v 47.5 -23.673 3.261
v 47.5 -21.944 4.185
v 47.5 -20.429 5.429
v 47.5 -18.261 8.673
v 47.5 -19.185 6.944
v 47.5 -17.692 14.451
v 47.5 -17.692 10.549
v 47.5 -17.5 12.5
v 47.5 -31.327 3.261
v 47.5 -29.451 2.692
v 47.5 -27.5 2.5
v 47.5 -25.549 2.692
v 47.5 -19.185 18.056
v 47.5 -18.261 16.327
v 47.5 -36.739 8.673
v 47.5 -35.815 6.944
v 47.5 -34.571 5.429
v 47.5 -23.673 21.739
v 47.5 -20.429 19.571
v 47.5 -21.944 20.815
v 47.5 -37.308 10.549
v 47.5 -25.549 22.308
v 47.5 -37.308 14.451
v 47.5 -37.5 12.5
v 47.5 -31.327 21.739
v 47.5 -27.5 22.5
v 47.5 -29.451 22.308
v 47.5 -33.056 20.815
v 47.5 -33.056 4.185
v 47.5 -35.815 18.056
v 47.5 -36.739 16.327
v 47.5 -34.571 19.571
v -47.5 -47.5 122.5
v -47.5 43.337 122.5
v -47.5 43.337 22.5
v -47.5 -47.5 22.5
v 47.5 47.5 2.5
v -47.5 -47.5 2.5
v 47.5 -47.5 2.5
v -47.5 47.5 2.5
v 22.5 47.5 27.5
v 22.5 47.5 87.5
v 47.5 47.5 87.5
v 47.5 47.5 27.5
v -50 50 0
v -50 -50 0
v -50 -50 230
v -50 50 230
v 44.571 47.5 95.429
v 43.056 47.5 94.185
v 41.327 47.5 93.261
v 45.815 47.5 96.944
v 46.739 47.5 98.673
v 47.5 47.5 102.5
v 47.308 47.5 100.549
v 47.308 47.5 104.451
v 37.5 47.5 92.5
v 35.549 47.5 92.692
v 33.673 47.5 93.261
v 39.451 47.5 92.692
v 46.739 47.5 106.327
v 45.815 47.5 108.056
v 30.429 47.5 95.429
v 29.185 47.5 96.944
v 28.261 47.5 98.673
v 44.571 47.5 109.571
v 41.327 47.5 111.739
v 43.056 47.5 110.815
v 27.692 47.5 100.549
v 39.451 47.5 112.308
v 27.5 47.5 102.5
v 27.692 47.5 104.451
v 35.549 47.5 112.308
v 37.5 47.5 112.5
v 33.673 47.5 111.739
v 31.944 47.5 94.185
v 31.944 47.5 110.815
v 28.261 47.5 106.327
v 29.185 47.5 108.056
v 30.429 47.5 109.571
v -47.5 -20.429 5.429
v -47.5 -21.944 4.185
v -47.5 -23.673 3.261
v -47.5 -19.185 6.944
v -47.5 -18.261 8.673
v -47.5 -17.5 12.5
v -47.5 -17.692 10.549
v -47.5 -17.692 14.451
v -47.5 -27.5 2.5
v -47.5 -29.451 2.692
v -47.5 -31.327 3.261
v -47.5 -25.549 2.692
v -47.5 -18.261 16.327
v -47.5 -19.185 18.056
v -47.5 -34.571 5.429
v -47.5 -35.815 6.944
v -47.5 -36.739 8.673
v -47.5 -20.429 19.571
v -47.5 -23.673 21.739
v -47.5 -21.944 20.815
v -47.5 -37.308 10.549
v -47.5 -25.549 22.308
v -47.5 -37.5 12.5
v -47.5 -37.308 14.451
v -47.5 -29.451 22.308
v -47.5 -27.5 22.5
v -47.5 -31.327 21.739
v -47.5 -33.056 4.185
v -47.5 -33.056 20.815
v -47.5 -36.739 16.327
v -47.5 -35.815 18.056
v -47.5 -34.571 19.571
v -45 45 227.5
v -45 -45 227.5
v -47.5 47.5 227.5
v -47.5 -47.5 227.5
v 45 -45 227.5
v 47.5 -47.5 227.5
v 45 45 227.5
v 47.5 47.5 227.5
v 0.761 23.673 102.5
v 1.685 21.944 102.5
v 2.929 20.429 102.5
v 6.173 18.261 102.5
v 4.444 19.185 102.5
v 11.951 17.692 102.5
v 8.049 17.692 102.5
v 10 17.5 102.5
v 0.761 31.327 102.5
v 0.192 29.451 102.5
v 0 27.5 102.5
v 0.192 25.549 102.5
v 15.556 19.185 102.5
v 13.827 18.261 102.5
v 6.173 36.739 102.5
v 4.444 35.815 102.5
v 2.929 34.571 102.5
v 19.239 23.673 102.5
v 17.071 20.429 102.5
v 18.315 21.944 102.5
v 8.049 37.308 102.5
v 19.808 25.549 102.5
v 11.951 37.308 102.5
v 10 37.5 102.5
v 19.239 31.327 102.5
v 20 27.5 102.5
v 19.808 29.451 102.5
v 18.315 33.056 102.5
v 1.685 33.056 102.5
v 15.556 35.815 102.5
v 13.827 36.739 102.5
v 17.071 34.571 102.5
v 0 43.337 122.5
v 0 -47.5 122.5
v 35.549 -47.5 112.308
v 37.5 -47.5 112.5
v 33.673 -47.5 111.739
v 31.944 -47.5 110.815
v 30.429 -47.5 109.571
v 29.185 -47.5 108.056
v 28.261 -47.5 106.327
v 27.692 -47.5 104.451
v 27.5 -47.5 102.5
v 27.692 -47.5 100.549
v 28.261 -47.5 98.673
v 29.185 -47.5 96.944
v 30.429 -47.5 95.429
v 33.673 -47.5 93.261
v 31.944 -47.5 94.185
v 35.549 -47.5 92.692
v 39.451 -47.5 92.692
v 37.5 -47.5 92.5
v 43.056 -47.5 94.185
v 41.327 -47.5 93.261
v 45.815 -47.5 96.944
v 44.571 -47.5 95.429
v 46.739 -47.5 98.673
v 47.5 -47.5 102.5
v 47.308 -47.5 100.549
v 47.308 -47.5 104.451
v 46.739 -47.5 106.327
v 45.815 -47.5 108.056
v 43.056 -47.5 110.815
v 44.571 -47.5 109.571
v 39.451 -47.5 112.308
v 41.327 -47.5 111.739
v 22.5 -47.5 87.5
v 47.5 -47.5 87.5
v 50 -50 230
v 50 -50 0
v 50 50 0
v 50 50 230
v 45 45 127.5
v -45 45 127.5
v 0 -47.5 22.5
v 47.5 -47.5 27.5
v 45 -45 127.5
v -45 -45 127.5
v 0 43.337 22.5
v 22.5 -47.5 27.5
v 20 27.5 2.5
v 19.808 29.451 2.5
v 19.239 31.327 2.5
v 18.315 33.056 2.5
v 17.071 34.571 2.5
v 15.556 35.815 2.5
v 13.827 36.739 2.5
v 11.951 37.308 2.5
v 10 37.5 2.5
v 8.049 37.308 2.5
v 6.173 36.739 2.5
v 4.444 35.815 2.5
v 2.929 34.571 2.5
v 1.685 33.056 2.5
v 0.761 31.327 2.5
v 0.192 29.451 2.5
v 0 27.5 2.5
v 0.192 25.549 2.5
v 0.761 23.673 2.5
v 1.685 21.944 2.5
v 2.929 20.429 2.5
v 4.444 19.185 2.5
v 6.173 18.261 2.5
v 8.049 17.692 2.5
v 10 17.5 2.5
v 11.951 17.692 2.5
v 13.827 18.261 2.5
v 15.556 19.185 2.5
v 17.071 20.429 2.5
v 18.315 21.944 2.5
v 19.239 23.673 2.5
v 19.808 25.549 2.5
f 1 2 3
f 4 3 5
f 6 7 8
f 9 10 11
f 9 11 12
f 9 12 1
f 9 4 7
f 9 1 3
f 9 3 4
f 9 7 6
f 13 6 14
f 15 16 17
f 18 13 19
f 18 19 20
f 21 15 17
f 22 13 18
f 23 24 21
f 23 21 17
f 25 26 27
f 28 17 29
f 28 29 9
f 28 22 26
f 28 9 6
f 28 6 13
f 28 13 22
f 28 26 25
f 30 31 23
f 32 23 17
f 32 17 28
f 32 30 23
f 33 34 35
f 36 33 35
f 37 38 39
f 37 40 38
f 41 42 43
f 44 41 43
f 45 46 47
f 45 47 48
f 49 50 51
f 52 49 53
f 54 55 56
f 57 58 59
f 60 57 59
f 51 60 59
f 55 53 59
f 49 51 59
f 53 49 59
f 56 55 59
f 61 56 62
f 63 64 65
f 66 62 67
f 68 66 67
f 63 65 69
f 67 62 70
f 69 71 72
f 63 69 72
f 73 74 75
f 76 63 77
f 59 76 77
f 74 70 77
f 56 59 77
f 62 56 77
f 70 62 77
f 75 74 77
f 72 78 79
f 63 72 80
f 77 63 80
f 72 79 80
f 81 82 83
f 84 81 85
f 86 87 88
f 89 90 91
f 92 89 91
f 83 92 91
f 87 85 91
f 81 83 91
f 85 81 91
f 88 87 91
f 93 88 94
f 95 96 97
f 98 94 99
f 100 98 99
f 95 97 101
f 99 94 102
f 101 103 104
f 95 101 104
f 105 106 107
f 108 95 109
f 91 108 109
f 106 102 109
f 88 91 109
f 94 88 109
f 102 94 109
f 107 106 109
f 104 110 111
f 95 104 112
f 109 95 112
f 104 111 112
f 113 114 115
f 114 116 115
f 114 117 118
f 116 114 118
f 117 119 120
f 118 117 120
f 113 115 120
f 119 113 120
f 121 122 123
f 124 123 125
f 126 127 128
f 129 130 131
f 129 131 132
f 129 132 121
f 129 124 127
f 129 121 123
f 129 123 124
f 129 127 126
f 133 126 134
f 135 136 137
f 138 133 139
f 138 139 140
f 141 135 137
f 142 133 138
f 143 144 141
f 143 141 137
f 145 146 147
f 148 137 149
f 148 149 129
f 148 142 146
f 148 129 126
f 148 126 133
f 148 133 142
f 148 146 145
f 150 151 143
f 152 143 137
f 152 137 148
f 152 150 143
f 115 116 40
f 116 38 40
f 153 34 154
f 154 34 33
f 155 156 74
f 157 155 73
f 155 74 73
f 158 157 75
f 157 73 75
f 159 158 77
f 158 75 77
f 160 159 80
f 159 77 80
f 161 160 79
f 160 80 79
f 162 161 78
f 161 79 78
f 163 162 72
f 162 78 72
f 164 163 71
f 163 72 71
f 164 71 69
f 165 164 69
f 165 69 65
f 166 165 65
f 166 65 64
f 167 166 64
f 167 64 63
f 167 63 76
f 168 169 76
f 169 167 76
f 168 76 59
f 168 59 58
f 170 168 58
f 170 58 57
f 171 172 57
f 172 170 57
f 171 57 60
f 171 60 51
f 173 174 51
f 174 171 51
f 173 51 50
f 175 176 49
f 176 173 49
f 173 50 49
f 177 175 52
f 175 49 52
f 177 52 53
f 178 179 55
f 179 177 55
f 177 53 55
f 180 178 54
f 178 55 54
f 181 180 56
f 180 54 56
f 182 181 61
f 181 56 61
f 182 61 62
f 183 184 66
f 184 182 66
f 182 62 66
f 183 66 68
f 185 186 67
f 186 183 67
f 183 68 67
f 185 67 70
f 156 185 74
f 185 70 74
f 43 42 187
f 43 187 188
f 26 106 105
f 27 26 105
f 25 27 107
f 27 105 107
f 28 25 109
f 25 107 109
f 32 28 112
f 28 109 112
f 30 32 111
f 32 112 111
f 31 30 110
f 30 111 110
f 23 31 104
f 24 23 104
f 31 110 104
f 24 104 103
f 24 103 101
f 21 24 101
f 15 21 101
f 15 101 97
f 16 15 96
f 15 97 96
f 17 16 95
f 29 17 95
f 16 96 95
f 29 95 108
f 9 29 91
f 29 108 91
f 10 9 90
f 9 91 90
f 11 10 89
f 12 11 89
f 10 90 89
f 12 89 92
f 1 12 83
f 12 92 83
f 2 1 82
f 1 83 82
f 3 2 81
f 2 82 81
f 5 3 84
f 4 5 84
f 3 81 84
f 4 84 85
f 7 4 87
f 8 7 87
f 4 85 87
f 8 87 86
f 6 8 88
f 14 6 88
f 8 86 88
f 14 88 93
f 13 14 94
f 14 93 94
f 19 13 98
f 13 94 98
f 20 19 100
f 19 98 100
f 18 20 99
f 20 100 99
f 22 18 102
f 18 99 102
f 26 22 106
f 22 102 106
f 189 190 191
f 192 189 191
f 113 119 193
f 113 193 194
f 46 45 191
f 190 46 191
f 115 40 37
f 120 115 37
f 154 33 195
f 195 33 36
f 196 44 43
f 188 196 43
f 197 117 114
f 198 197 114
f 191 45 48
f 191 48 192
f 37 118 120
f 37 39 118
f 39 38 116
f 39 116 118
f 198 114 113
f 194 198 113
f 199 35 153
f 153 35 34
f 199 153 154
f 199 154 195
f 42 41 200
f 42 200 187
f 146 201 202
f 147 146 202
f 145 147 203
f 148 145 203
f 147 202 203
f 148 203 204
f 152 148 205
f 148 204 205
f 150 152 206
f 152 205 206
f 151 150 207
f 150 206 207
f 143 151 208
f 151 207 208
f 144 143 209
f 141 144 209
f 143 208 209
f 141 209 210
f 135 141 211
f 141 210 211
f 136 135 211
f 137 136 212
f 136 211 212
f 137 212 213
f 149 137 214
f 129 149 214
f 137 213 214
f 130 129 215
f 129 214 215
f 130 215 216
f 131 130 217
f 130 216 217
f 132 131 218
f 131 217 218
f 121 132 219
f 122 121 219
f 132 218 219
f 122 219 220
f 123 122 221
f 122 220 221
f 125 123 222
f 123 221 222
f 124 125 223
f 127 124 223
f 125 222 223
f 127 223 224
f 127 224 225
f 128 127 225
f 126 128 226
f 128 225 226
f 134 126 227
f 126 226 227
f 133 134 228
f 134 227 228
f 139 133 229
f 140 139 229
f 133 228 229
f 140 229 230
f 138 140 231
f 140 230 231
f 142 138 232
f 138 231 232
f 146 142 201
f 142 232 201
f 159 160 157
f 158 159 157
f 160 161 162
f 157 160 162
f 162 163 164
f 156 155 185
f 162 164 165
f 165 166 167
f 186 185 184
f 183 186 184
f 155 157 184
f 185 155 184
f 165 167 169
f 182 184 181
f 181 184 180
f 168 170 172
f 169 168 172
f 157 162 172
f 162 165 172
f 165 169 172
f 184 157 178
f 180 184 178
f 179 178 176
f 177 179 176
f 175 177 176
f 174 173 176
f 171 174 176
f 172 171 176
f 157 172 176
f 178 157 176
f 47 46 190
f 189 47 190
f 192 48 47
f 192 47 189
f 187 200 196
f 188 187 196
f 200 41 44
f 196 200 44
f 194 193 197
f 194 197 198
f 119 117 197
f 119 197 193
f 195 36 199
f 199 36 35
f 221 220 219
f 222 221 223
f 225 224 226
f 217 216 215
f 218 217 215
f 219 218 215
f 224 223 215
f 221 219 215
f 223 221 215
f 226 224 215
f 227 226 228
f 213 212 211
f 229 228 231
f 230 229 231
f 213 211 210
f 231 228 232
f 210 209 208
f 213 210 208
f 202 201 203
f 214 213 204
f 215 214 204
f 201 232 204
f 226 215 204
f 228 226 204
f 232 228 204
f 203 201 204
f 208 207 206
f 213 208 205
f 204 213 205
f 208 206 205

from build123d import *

# Parameters (mm, degrees)
SKETCH1_W           = 100
SKETCH1_H           = 100
BOSS_EXTRUDE1_DEPTH = 230
SHELL2_T            = 2.5
BOSS_EXTRUDE2_DEPTH = 47.5
SKETCH2_3_R         = 10
BOSS_EXTRUDE3_DEPTH = 95
SKETCH4_R           = 10
BOSS_EXTRUDE5_DEPTH = 100
BOSS_EXTRUDE7_REACH = 256.767
SKETCH5_R           = 10
SKETCH5_W           = 25
SKETCH5_H           = 60
SKETCH6_W           = 90
SKETCH6_H           = 90
BOSS_EXTRUDE8_DEPTH = 100


with BuildPart() as part:
    # Sketch1 → Boss-Extrude1 (new body)
    with BuildSketch(Plane.XY):
        Rectangle(SKETCH1_W, SKETCH1_H)
    extrude(amount=BOSS_EXTRUDE1_DEPTH)

    # Shell2 (no face opened: a closed hollow body)
    add(offset(amount=-SHELL2_T, mode=Mode.PRIVATE), mode=Mode.SUBTRACT)


with BuildPart() as body_2:
    # Sketch2 → Boss-Extrude2 (new body)
    with BuildSketch(Plane(origin=(-47.5, 0, 0), x_dir=(0, 0, -1), z_dir=(1, 0, 0))):
        Polygon((-122.5, 43.336516415), (-122.5, -47.5), (-22.5, -47.5), (-22.5, -27.5), (-22.5, 43.336516415), align=None)
    extrude(amount=BOSS_EXTRUDE2_DEPTH)


with BuildPart() as body_3:
    # Sketch2<3> → Boss-Extrude3 (new body)
    with BuildSketch(Plane(origin=(-47.5, 0, 0), x_dir=(0, 0, -1), z_dir=(1, 0, 0))):
        with Locations(Location((-12.5, -27.5, 0), (0, 0, 180))):
            Circle(SKETCH2_3_R)
    extrude(amount=BOSS_EXTRUDE3_DEPTH)


with BuildPart() as body_4:
    # Sketch4 → Boss-Extrude5 (new body)
    with BuildSketch(Plane.XY.offset(2.5)):
        with Locations((10, 27.5)):
            Circle(SKETCH4_R)
    extrude(amount=BOSS_EXTRUDE5_DEPTH)


with BuildPart() as body_5:

    # Sketch5 → Boss-Extrude7 (new, up to next)
    with BuildSketch(Plane.XZ.offset(-47.5), mode=Mode.PRIVATE) as boss_extrude7_sk1:
        with Locations(Location((37.5, 102.5, 0), (0, 0, 90))):
            Circle(SKETCH5_R)
    boss_extrude7_tool1 = extrude(boss_extrude7_sk1.sketch, amount=BOSS_EXTRUDE7_REACH, mode=Mode.PRIVATE) - part.part
    # Sketch5 → Boss-Extrude7 (new, up to next)
    with BuildSketch(Plane.XZ.offset(-47.5), mode=Mode.PRIVATE) as boss_extrude7_sk2:
        with Locations((35, 57.5)):
            Rectangle(SKETCH5_W, SKETCH5_H)
    boss_extrude7_tool2 = extrude(boss_extrude7_sk2.sketch, amount=BOSS_EXTRUDE7_REACH, mode=Mode.PRIVATE) - part.part
    add(boss_extrude7_tool1.solids().sort_by_distance((37.5, 47.5, 102.5))[0])
    add(boss_extrude7_tool2.solids().sort_by_distance((35, 47.5, 57.5))[0])


with BuildPart() as part_1:
    add(part.part)

    # Sketch6 → Boss-Extrude8 (add)
    with BuildSketch(Plane(origin=(0, 0, 227.5), x_dir=(-1, 0, 0), z_dir=(0, 0, -1))):
        Rectangle(SKETCH6_W, SKETCH6_H)
    extrude(amount=BOSS_EXTRUDE8_DEPTH)


solid = Compound([body_2.part, body_3.part, body_4.part, body_5.part, part_1.part])
